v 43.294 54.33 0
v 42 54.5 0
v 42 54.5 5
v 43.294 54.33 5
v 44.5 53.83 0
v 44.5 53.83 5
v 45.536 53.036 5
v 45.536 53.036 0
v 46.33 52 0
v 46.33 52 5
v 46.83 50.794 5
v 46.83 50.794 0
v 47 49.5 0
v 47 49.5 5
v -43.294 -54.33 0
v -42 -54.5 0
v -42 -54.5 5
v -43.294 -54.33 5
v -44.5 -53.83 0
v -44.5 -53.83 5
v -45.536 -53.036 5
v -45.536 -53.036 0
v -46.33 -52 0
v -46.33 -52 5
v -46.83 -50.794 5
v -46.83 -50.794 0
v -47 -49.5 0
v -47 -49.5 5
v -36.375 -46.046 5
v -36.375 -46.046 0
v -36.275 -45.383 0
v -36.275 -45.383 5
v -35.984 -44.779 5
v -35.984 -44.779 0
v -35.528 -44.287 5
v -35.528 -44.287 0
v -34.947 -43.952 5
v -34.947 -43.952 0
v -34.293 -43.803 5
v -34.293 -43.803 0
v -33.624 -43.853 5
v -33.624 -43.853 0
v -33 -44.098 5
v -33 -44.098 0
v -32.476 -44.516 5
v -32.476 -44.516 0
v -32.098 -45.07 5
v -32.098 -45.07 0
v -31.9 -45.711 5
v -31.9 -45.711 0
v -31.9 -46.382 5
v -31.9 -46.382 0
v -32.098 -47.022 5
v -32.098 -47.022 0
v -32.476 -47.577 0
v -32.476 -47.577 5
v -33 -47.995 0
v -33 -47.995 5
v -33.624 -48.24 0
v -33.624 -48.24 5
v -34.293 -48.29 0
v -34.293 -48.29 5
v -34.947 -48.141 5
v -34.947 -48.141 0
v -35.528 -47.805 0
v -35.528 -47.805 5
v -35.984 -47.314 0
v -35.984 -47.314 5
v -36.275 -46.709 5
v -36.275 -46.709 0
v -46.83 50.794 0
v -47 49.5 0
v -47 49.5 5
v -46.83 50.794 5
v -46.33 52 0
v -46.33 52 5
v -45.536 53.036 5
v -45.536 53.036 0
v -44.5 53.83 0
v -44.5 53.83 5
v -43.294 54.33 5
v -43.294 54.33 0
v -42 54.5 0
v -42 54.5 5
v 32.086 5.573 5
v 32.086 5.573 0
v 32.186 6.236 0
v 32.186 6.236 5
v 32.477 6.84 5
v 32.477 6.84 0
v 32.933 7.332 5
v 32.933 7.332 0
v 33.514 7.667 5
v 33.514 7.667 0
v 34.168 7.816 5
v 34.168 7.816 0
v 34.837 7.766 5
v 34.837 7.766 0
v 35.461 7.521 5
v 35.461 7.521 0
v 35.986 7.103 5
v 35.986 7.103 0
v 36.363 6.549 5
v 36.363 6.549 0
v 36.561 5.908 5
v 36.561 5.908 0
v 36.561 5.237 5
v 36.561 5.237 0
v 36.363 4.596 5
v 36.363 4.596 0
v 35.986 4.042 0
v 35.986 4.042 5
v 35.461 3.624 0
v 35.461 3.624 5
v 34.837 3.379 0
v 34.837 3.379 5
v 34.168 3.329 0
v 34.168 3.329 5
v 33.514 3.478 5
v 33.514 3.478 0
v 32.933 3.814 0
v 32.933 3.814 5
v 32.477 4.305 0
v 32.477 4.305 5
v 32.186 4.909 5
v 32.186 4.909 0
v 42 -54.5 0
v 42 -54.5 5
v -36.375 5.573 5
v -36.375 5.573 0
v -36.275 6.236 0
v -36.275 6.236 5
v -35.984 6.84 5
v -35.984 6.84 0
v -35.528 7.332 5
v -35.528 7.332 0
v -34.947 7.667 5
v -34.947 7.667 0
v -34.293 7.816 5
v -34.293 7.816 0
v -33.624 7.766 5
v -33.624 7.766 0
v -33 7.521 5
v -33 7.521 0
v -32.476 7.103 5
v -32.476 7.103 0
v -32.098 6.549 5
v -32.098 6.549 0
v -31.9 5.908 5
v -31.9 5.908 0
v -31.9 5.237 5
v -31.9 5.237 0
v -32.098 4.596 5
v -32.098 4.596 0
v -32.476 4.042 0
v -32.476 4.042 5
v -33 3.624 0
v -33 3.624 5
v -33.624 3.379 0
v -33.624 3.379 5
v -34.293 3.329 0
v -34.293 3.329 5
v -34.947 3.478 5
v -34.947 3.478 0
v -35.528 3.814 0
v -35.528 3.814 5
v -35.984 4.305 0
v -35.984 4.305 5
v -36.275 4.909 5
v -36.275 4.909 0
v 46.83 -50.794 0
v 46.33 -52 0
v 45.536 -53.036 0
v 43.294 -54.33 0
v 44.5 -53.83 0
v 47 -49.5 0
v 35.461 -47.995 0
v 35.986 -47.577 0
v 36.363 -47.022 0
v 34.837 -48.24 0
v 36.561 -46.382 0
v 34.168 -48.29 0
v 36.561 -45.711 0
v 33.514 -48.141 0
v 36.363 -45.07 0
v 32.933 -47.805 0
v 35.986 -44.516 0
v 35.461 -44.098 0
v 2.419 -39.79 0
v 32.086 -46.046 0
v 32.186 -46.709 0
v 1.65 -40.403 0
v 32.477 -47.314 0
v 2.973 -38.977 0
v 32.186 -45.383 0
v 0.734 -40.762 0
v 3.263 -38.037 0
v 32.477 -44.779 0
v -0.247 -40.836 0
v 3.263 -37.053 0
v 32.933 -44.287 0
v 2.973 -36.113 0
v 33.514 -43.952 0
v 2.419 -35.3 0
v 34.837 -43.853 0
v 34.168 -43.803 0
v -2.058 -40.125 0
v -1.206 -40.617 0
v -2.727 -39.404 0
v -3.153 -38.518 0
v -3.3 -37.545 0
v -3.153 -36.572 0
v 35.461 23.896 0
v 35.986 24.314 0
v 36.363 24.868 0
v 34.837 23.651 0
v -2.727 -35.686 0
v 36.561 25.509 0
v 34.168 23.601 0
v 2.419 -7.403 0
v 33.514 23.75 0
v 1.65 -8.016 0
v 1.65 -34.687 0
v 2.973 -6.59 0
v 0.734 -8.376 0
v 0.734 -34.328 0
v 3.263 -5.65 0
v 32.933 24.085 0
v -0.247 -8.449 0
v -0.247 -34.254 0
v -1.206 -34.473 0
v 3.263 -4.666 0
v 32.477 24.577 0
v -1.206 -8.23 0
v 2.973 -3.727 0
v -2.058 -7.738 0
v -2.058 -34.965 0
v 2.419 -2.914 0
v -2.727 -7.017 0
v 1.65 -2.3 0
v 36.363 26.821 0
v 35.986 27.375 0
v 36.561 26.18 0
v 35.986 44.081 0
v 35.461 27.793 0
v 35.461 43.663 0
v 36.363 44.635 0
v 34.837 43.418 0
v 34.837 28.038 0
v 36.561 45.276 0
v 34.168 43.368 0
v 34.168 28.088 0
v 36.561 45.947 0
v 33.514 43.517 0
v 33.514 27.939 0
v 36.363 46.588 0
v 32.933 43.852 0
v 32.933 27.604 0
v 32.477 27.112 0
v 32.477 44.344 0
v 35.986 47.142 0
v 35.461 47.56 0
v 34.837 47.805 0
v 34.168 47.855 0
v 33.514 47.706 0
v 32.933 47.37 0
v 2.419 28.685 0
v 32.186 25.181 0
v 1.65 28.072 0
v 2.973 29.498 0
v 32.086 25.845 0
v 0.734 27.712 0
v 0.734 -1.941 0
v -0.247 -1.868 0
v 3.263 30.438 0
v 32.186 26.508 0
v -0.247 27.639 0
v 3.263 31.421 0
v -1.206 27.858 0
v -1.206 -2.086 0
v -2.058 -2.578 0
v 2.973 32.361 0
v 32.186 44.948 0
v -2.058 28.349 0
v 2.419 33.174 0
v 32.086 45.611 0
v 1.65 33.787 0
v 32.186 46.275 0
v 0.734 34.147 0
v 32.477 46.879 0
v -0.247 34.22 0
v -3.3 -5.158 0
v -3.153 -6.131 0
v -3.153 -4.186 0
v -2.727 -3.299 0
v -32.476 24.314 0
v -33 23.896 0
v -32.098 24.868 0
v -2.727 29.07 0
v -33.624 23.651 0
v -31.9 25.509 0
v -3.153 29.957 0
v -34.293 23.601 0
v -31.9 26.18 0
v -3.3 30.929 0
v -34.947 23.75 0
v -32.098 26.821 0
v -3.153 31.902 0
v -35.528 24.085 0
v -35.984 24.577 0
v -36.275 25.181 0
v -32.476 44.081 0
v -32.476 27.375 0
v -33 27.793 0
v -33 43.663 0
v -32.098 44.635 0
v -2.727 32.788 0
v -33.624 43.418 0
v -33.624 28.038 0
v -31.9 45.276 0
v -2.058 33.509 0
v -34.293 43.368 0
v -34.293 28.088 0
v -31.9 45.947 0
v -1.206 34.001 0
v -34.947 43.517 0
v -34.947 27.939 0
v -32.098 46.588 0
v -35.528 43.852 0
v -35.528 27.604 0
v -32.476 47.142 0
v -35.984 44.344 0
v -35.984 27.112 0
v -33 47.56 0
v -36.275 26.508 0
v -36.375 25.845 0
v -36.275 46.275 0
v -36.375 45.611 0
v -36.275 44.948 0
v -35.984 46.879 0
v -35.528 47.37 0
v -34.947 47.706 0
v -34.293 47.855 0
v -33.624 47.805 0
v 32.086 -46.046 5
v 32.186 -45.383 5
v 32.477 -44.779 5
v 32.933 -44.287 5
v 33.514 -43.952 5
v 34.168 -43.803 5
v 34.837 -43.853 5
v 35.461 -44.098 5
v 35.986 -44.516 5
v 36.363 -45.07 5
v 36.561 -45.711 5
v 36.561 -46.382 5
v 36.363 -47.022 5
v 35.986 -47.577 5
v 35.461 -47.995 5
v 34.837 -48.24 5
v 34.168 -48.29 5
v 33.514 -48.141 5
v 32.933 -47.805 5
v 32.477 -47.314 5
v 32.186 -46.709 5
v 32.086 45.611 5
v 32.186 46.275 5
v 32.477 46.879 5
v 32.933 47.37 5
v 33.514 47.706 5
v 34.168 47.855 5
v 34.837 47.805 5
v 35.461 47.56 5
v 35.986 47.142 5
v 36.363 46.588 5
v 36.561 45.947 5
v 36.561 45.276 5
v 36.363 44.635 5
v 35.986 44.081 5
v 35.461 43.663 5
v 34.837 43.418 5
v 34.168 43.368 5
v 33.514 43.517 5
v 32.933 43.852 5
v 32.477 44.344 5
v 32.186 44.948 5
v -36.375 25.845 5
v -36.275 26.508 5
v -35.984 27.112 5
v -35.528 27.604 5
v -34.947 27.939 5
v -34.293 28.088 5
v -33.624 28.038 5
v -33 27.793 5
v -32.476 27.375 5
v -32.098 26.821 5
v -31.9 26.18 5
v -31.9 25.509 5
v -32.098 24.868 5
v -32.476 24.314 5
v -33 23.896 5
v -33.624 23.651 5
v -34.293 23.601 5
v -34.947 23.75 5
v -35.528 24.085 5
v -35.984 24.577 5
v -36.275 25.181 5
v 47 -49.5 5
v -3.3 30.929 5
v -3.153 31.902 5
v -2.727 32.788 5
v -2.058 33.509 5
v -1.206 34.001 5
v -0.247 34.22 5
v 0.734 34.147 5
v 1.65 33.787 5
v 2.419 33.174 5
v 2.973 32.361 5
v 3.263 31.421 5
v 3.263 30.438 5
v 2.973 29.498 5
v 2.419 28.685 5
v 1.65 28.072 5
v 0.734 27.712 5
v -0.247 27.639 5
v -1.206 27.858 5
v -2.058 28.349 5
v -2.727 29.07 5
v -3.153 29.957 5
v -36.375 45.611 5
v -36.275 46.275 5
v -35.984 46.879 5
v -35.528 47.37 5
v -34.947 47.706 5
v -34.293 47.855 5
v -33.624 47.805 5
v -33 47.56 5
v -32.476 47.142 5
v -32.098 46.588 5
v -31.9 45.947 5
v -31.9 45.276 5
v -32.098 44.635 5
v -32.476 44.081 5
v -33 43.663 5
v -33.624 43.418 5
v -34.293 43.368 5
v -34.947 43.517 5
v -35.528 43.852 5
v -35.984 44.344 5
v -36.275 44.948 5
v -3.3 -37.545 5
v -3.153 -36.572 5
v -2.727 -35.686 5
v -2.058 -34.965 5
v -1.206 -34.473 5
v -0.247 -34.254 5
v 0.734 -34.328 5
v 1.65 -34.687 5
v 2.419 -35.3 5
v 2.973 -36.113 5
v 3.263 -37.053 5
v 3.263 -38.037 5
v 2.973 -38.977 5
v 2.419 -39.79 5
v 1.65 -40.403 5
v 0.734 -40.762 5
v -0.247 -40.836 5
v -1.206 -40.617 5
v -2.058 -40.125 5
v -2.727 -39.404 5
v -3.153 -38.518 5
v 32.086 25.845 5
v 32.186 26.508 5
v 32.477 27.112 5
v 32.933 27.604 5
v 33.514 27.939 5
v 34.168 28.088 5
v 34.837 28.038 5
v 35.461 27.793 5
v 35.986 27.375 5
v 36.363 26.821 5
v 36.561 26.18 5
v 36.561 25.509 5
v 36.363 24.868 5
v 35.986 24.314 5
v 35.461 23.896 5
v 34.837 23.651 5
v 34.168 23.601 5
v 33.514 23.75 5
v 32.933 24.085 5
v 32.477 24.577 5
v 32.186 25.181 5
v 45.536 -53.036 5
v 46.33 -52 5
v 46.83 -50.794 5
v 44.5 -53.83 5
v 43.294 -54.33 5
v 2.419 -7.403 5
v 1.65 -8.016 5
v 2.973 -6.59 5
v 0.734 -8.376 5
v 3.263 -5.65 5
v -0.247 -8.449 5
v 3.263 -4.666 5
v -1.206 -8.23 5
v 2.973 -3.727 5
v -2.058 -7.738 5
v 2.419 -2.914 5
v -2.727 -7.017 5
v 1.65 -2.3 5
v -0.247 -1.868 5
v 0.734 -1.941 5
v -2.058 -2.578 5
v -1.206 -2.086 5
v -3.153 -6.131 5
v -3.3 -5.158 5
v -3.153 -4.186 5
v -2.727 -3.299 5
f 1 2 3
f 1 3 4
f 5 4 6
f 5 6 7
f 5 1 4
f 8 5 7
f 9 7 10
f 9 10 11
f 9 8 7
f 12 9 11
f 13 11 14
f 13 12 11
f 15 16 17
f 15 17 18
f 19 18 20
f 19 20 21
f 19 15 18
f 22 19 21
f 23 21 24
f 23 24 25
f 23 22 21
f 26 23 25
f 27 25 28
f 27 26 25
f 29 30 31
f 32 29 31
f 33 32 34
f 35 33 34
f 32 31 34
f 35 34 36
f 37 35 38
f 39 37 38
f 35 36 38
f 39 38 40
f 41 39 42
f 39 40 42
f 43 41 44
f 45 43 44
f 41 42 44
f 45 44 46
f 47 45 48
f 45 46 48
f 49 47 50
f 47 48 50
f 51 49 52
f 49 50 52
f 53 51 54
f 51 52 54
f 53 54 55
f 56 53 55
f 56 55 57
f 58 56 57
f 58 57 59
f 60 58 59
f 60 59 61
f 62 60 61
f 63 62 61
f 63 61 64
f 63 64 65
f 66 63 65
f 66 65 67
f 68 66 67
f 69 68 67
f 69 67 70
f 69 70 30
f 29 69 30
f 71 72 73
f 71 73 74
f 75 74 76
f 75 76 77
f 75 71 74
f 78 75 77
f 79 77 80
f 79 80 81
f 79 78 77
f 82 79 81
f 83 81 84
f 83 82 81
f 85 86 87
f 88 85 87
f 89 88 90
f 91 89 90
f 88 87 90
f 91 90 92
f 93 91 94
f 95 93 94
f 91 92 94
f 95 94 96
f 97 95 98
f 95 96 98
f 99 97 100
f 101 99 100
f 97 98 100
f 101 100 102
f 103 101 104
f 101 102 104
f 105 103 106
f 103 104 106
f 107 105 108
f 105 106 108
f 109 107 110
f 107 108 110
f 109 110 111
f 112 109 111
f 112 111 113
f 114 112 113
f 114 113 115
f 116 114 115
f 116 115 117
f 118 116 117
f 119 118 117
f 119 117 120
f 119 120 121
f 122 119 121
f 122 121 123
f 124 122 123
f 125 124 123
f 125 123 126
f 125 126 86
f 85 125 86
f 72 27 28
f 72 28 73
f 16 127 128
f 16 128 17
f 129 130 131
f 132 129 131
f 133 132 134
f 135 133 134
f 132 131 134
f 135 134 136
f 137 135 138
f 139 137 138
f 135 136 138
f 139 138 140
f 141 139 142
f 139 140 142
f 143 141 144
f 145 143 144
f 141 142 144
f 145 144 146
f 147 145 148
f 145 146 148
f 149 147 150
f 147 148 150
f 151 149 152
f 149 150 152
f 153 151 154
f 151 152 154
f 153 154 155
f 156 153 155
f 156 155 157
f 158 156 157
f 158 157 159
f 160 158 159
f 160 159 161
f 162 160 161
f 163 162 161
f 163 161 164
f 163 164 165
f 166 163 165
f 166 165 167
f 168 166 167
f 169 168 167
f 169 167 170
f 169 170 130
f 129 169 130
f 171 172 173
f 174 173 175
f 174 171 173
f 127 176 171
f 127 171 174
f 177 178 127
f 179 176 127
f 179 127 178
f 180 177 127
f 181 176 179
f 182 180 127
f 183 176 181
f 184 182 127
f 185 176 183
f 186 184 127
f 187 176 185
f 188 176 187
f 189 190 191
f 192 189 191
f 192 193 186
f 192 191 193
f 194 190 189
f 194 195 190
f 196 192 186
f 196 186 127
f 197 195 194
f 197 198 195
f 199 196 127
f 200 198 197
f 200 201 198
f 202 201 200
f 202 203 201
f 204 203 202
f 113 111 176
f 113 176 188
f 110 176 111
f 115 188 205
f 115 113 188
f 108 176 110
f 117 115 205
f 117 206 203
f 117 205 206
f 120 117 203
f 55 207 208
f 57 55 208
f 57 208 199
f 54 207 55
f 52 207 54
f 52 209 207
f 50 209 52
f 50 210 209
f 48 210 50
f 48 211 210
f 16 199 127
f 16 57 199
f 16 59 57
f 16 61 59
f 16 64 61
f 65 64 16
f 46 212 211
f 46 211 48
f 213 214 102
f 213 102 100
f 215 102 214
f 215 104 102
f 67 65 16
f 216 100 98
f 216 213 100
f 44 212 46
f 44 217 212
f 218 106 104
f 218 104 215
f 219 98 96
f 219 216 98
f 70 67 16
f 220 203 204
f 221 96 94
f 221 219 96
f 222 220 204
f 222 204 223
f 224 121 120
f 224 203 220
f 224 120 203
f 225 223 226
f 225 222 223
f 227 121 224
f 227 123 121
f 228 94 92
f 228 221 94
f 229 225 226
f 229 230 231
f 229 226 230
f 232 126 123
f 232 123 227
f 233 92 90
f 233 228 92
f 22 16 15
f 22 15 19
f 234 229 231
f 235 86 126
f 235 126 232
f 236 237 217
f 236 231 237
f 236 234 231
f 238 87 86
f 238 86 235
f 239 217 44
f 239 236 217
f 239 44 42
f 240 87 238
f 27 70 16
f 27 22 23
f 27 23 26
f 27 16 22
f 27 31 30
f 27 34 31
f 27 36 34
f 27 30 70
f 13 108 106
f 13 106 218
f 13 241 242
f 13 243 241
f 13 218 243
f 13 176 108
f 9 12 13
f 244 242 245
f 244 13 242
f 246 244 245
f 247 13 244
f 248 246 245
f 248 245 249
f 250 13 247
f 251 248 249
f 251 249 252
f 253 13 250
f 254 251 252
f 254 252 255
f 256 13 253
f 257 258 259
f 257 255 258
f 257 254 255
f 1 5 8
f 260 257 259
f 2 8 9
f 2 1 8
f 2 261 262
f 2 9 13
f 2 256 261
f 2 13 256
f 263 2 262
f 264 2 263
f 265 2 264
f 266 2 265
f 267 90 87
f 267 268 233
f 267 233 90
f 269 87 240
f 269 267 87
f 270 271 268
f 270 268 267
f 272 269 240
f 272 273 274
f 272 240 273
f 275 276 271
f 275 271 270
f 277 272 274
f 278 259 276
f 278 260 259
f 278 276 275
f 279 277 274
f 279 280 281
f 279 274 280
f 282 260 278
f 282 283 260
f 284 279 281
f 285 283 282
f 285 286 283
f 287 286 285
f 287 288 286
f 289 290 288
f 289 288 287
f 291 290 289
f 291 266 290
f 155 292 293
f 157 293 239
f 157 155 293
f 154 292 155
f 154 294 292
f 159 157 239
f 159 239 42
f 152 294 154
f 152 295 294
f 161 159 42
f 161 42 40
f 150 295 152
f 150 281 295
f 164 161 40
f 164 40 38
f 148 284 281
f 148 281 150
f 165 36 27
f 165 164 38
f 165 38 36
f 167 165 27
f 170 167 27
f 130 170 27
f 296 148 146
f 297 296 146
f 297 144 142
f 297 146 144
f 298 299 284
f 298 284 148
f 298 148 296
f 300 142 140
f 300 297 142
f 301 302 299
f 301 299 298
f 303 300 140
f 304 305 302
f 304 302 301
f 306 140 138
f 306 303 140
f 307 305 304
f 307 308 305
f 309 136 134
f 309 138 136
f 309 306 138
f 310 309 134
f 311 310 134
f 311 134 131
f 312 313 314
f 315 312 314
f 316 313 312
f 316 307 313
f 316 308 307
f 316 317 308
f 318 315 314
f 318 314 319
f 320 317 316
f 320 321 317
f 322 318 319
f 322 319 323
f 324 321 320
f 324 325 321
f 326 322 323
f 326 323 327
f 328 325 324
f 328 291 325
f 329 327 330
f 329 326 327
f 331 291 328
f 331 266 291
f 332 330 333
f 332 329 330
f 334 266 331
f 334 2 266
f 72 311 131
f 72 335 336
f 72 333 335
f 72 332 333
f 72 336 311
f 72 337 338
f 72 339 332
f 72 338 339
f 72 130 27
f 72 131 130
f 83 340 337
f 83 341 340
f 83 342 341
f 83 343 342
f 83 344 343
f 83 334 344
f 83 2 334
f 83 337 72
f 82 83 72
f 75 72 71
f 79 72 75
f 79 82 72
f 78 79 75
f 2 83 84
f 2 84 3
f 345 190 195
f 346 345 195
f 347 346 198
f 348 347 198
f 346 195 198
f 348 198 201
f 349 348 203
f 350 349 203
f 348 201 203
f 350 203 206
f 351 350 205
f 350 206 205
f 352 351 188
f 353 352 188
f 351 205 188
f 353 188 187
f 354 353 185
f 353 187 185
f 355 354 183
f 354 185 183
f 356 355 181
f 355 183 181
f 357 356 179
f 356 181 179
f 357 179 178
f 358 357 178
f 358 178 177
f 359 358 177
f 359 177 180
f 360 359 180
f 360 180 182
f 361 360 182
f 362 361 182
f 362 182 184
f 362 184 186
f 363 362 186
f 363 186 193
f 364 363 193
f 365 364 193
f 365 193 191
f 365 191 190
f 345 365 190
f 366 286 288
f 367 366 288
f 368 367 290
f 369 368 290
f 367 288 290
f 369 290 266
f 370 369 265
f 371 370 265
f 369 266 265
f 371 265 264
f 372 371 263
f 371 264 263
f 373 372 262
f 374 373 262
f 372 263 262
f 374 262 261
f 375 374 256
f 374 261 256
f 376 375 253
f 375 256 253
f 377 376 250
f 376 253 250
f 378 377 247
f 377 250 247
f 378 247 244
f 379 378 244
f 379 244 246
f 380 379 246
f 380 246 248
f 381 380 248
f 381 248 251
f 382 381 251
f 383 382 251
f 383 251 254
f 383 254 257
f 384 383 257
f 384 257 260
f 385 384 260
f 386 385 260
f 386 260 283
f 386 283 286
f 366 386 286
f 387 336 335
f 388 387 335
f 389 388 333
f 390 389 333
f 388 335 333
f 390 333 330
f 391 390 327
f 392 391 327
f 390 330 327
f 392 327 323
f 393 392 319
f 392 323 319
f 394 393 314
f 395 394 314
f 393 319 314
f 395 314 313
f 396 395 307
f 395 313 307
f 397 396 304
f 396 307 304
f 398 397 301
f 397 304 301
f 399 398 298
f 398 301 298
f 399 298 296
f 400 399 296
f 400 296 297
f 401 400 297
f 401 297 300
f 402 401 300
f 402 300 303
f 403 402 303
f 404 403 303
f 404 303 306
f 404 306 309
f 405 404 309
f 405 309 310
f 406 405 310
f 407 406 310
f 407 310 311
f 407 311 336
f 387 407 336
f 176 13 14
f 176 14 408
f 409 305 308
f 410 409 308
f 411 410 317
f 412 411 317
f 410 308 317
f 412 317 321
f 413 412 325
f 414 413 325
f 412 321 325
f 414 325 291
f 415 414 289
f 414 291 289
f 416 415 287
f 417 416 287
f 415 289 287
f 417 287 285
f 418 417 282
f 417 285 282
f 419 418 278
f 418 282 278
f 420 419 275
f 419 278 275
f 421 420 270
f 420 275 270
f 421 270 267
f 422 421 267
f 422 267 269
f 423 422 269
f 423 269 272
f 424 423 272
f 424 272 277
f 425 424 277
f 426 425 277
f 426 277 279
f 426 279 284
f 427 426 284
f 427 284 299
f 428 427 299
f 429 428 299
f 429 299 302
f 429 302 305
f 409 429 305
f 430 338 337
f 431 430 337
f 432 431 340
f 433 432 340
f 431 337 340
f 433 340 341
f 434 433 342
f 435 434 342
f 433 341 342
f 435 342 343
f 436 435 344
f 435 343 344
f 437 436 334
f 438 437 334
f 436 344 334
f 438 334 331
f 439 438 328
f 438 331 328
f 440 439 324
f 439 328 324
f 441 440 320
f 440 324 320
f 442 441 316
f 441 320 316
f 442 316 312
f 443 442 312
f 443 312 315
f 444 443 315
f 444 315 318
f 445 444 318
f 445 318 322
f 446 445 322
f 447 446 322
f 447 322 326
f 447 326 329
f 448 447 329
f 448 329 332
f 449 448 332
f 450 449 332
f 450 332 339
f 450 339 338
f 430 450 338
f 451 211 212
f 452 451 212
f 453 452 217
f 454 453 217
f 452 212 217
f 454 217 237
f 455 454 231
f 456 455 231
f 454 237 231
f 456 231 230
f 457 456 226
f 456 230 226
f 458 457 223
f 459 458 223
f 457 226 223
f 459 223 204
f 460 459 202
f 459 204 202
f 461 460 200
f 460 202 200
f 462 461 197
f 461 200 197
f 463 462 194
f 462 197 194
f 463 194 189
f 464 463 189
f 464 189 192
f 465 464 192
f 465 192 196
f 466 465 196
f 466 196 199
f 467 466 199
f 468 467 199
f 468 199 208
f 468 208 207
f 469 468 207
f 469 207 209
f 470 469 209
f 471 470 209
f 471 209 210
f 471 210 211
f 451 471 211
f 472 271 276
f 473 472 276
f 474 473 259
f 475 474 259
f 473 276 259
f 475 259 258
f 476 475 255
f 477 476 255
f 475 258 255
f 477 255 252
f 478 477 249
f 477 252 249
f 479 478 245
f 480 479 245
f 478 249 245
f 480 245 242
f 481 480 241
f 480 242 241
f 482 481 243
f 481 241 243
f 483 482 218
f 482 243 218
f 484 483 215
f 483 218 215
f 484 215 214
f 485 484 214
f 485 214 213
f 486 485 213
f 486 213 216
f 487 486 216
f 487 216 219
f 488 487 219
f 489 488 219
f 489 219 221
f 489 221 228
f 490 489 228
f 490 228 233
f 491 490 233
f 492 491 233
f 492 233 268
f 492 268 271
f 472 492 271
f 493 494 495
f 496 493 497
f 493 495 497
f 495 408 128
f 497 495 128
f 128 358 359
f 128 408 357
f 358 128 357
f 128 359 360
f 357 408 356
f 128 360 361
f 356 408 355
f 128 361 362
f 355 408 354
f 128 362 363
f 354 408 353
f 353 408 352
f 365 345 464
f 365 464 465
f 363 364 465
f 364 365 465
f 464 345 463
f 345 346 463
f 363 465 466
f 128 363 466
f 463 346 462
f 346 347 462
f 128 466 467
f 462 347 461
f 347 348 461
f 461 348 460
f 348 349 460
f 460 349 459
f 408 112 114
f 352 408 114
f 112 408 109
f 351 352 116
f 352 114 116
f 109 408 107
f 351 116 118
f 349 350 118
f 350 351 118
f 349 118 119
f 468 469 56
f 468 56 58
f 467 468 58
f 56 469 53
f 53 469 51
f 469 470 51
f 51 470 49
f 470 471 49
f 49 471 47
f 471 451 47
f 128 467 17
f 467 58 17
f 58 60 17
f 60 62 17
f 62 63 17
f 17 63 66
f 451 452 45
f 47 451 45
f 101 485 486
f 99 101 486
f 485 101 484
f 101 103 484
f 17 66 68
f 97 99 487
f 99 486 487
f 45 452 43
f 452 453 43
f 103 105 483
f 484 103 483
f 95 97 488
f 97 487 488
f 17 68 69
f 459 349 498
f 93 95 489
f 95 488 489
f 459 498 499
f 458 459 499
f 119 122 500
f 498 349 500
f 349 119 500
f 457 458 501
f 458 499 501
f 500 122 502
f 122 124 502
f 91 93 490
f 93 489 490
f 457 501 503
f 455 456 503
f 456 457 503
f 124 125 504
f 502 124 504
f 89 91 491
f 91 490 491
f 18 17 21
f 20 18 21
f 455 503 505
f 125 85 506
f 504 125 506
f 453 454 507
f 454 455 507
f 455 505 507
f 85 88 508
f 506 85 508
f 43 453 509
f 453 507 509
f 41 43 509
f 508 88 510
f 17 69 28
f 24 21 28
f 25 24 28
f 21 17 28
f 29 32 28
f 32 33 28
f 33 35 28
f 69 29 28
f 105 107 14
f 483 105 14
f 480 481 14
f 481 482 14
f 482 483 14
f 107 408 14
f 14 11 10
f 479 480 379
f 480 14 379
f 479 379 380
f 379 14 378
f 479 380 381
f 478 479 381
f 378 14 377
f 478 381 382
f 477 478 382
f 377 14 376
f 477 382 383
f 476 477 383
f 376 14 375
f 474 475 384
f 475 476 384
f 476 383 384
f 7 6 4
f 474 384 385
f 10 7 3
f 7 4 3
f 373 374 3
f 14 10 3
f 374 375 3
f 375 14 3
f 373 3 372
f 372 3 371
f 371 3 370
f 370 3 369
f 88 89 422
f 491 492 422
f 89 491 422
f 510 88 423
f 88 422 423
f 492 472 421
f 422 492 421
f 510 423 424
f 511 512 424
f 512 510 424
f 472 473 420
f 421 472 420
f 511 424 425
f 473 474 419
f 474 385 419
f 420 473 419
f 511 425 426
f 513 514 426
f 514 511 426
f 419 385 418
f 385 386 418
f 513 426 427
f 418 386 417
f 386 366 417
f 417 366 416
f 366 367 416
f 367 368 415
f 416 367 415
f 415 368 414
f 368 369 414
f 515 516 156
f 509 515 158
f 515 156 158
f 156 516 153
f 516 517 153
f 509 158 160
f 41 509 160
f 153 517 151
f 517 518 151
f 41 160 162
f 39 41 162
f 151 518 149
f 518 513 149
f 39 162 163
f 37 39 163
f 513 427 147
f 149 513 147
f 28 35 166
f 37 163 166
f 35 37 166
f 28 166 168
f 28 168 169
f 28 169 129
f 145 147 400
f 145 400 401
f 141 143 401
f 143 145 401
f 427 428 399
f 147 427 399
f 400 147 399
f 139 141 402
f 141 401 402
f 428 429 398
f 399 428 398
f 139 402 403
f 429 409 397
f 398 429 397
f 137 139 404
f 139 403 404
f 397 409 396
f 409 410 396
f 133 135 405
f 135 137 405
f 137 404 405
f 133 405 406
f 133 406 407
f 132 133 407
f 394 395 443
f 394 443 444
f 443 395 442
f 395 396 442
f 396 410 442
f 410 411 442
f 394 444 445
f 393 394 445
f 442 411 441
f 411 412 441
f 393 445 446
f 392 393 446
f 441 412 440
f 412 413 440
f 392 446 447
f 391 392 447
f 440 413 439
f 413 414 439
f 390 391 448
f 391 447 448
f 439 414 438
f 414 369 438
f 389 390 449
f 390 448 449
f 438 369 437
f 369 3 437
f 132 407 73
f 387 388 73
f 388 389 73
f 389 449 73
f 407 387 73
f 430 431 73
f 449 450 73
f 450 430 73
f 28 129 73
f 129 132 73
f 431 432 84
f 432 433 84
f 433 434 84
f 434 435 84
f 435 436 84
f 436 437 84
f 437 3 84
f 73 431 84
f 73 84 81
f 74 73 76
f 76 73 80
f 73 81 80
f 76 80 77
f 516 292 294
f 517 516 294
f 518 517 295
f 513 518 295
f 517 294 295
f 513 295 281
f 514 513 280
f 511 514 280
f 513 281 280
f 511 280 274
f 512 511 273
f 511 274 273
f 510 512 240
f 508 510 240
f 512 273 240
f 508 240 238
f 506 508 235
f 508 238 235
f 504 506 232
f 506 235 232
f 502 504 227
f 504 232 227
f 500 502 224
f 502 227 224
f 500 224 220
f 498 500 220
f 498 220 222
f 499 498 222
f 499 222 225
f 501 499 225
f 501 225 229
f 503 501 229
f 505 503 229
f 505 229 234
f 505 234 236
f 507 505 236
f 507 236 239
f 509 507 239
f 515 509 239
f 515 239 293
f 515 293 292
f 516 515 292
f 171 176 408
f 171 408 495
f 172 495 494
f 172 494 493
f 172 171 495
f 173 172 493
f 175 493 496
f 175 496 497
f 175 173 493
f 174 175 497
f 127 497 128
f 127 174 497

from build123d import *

# Parameters (mm, degrees)
BOSS_EXTRU_1_DEPTH = 5
D_GAGEMENT_M61_D   = 6.6
D_GAGEMENT_M41_D   = 4.5


with BuildPart() as part:
    # Esquisse1 → Boss.-Extru.1 (new body)
    with BuildSketch(Plane.XY):
        with BuildLine():
            Line((-42, 54.5), (42, 54.5))
            ThreePointArc((42, 54.5), (45.535533906, 53.035533906), (47, 49.5))
            Line((47, 49.5), (47, -49.5))
            ThreePointArc((47, -49.5), (45.535533906, -53.035533906), (42, -54.5))
            Line((42, -54.5), (-42, -54.5))
            ThreePointArc((-42, -54.5), (-45.535533906, -53.035533906), (-47, -49.5))
            Line((-47, -49.5), (-47, 49.5))
            ThreePointArc((-47, 49.5), (-45.535533906, 53.035533906), (-42, 54.5))
        make_face()
    extrude(amount=BOSS_EXTRU_1_DEPTH)

    # Dégagement M61 (through all)
    with Locations(Plane.XY.offset(5)):
        with Locations((0, 30.929411148), (0, -37.544992042), (0, -5.15832988)):
            Hole(D_GAGEMENT_M61_D / 2)

    # Dégagement M41 (through all)
    with Locations(Plane.XY.offset(5)):
        with Locations((34.336239969, 45.611301296), (34.336239969, 25.844548243), (34.336239969, 5.572681811), (34.336239969, -46.046219335), (-34.125150255, -46.046219335), (-34.125150255, 5.572681811), (-34.125150255, 25.844548243), (-34.125150255, 45.611301296)):
            Hole(D_GAGEMENT_M41_D / 2)


solid = part.part
